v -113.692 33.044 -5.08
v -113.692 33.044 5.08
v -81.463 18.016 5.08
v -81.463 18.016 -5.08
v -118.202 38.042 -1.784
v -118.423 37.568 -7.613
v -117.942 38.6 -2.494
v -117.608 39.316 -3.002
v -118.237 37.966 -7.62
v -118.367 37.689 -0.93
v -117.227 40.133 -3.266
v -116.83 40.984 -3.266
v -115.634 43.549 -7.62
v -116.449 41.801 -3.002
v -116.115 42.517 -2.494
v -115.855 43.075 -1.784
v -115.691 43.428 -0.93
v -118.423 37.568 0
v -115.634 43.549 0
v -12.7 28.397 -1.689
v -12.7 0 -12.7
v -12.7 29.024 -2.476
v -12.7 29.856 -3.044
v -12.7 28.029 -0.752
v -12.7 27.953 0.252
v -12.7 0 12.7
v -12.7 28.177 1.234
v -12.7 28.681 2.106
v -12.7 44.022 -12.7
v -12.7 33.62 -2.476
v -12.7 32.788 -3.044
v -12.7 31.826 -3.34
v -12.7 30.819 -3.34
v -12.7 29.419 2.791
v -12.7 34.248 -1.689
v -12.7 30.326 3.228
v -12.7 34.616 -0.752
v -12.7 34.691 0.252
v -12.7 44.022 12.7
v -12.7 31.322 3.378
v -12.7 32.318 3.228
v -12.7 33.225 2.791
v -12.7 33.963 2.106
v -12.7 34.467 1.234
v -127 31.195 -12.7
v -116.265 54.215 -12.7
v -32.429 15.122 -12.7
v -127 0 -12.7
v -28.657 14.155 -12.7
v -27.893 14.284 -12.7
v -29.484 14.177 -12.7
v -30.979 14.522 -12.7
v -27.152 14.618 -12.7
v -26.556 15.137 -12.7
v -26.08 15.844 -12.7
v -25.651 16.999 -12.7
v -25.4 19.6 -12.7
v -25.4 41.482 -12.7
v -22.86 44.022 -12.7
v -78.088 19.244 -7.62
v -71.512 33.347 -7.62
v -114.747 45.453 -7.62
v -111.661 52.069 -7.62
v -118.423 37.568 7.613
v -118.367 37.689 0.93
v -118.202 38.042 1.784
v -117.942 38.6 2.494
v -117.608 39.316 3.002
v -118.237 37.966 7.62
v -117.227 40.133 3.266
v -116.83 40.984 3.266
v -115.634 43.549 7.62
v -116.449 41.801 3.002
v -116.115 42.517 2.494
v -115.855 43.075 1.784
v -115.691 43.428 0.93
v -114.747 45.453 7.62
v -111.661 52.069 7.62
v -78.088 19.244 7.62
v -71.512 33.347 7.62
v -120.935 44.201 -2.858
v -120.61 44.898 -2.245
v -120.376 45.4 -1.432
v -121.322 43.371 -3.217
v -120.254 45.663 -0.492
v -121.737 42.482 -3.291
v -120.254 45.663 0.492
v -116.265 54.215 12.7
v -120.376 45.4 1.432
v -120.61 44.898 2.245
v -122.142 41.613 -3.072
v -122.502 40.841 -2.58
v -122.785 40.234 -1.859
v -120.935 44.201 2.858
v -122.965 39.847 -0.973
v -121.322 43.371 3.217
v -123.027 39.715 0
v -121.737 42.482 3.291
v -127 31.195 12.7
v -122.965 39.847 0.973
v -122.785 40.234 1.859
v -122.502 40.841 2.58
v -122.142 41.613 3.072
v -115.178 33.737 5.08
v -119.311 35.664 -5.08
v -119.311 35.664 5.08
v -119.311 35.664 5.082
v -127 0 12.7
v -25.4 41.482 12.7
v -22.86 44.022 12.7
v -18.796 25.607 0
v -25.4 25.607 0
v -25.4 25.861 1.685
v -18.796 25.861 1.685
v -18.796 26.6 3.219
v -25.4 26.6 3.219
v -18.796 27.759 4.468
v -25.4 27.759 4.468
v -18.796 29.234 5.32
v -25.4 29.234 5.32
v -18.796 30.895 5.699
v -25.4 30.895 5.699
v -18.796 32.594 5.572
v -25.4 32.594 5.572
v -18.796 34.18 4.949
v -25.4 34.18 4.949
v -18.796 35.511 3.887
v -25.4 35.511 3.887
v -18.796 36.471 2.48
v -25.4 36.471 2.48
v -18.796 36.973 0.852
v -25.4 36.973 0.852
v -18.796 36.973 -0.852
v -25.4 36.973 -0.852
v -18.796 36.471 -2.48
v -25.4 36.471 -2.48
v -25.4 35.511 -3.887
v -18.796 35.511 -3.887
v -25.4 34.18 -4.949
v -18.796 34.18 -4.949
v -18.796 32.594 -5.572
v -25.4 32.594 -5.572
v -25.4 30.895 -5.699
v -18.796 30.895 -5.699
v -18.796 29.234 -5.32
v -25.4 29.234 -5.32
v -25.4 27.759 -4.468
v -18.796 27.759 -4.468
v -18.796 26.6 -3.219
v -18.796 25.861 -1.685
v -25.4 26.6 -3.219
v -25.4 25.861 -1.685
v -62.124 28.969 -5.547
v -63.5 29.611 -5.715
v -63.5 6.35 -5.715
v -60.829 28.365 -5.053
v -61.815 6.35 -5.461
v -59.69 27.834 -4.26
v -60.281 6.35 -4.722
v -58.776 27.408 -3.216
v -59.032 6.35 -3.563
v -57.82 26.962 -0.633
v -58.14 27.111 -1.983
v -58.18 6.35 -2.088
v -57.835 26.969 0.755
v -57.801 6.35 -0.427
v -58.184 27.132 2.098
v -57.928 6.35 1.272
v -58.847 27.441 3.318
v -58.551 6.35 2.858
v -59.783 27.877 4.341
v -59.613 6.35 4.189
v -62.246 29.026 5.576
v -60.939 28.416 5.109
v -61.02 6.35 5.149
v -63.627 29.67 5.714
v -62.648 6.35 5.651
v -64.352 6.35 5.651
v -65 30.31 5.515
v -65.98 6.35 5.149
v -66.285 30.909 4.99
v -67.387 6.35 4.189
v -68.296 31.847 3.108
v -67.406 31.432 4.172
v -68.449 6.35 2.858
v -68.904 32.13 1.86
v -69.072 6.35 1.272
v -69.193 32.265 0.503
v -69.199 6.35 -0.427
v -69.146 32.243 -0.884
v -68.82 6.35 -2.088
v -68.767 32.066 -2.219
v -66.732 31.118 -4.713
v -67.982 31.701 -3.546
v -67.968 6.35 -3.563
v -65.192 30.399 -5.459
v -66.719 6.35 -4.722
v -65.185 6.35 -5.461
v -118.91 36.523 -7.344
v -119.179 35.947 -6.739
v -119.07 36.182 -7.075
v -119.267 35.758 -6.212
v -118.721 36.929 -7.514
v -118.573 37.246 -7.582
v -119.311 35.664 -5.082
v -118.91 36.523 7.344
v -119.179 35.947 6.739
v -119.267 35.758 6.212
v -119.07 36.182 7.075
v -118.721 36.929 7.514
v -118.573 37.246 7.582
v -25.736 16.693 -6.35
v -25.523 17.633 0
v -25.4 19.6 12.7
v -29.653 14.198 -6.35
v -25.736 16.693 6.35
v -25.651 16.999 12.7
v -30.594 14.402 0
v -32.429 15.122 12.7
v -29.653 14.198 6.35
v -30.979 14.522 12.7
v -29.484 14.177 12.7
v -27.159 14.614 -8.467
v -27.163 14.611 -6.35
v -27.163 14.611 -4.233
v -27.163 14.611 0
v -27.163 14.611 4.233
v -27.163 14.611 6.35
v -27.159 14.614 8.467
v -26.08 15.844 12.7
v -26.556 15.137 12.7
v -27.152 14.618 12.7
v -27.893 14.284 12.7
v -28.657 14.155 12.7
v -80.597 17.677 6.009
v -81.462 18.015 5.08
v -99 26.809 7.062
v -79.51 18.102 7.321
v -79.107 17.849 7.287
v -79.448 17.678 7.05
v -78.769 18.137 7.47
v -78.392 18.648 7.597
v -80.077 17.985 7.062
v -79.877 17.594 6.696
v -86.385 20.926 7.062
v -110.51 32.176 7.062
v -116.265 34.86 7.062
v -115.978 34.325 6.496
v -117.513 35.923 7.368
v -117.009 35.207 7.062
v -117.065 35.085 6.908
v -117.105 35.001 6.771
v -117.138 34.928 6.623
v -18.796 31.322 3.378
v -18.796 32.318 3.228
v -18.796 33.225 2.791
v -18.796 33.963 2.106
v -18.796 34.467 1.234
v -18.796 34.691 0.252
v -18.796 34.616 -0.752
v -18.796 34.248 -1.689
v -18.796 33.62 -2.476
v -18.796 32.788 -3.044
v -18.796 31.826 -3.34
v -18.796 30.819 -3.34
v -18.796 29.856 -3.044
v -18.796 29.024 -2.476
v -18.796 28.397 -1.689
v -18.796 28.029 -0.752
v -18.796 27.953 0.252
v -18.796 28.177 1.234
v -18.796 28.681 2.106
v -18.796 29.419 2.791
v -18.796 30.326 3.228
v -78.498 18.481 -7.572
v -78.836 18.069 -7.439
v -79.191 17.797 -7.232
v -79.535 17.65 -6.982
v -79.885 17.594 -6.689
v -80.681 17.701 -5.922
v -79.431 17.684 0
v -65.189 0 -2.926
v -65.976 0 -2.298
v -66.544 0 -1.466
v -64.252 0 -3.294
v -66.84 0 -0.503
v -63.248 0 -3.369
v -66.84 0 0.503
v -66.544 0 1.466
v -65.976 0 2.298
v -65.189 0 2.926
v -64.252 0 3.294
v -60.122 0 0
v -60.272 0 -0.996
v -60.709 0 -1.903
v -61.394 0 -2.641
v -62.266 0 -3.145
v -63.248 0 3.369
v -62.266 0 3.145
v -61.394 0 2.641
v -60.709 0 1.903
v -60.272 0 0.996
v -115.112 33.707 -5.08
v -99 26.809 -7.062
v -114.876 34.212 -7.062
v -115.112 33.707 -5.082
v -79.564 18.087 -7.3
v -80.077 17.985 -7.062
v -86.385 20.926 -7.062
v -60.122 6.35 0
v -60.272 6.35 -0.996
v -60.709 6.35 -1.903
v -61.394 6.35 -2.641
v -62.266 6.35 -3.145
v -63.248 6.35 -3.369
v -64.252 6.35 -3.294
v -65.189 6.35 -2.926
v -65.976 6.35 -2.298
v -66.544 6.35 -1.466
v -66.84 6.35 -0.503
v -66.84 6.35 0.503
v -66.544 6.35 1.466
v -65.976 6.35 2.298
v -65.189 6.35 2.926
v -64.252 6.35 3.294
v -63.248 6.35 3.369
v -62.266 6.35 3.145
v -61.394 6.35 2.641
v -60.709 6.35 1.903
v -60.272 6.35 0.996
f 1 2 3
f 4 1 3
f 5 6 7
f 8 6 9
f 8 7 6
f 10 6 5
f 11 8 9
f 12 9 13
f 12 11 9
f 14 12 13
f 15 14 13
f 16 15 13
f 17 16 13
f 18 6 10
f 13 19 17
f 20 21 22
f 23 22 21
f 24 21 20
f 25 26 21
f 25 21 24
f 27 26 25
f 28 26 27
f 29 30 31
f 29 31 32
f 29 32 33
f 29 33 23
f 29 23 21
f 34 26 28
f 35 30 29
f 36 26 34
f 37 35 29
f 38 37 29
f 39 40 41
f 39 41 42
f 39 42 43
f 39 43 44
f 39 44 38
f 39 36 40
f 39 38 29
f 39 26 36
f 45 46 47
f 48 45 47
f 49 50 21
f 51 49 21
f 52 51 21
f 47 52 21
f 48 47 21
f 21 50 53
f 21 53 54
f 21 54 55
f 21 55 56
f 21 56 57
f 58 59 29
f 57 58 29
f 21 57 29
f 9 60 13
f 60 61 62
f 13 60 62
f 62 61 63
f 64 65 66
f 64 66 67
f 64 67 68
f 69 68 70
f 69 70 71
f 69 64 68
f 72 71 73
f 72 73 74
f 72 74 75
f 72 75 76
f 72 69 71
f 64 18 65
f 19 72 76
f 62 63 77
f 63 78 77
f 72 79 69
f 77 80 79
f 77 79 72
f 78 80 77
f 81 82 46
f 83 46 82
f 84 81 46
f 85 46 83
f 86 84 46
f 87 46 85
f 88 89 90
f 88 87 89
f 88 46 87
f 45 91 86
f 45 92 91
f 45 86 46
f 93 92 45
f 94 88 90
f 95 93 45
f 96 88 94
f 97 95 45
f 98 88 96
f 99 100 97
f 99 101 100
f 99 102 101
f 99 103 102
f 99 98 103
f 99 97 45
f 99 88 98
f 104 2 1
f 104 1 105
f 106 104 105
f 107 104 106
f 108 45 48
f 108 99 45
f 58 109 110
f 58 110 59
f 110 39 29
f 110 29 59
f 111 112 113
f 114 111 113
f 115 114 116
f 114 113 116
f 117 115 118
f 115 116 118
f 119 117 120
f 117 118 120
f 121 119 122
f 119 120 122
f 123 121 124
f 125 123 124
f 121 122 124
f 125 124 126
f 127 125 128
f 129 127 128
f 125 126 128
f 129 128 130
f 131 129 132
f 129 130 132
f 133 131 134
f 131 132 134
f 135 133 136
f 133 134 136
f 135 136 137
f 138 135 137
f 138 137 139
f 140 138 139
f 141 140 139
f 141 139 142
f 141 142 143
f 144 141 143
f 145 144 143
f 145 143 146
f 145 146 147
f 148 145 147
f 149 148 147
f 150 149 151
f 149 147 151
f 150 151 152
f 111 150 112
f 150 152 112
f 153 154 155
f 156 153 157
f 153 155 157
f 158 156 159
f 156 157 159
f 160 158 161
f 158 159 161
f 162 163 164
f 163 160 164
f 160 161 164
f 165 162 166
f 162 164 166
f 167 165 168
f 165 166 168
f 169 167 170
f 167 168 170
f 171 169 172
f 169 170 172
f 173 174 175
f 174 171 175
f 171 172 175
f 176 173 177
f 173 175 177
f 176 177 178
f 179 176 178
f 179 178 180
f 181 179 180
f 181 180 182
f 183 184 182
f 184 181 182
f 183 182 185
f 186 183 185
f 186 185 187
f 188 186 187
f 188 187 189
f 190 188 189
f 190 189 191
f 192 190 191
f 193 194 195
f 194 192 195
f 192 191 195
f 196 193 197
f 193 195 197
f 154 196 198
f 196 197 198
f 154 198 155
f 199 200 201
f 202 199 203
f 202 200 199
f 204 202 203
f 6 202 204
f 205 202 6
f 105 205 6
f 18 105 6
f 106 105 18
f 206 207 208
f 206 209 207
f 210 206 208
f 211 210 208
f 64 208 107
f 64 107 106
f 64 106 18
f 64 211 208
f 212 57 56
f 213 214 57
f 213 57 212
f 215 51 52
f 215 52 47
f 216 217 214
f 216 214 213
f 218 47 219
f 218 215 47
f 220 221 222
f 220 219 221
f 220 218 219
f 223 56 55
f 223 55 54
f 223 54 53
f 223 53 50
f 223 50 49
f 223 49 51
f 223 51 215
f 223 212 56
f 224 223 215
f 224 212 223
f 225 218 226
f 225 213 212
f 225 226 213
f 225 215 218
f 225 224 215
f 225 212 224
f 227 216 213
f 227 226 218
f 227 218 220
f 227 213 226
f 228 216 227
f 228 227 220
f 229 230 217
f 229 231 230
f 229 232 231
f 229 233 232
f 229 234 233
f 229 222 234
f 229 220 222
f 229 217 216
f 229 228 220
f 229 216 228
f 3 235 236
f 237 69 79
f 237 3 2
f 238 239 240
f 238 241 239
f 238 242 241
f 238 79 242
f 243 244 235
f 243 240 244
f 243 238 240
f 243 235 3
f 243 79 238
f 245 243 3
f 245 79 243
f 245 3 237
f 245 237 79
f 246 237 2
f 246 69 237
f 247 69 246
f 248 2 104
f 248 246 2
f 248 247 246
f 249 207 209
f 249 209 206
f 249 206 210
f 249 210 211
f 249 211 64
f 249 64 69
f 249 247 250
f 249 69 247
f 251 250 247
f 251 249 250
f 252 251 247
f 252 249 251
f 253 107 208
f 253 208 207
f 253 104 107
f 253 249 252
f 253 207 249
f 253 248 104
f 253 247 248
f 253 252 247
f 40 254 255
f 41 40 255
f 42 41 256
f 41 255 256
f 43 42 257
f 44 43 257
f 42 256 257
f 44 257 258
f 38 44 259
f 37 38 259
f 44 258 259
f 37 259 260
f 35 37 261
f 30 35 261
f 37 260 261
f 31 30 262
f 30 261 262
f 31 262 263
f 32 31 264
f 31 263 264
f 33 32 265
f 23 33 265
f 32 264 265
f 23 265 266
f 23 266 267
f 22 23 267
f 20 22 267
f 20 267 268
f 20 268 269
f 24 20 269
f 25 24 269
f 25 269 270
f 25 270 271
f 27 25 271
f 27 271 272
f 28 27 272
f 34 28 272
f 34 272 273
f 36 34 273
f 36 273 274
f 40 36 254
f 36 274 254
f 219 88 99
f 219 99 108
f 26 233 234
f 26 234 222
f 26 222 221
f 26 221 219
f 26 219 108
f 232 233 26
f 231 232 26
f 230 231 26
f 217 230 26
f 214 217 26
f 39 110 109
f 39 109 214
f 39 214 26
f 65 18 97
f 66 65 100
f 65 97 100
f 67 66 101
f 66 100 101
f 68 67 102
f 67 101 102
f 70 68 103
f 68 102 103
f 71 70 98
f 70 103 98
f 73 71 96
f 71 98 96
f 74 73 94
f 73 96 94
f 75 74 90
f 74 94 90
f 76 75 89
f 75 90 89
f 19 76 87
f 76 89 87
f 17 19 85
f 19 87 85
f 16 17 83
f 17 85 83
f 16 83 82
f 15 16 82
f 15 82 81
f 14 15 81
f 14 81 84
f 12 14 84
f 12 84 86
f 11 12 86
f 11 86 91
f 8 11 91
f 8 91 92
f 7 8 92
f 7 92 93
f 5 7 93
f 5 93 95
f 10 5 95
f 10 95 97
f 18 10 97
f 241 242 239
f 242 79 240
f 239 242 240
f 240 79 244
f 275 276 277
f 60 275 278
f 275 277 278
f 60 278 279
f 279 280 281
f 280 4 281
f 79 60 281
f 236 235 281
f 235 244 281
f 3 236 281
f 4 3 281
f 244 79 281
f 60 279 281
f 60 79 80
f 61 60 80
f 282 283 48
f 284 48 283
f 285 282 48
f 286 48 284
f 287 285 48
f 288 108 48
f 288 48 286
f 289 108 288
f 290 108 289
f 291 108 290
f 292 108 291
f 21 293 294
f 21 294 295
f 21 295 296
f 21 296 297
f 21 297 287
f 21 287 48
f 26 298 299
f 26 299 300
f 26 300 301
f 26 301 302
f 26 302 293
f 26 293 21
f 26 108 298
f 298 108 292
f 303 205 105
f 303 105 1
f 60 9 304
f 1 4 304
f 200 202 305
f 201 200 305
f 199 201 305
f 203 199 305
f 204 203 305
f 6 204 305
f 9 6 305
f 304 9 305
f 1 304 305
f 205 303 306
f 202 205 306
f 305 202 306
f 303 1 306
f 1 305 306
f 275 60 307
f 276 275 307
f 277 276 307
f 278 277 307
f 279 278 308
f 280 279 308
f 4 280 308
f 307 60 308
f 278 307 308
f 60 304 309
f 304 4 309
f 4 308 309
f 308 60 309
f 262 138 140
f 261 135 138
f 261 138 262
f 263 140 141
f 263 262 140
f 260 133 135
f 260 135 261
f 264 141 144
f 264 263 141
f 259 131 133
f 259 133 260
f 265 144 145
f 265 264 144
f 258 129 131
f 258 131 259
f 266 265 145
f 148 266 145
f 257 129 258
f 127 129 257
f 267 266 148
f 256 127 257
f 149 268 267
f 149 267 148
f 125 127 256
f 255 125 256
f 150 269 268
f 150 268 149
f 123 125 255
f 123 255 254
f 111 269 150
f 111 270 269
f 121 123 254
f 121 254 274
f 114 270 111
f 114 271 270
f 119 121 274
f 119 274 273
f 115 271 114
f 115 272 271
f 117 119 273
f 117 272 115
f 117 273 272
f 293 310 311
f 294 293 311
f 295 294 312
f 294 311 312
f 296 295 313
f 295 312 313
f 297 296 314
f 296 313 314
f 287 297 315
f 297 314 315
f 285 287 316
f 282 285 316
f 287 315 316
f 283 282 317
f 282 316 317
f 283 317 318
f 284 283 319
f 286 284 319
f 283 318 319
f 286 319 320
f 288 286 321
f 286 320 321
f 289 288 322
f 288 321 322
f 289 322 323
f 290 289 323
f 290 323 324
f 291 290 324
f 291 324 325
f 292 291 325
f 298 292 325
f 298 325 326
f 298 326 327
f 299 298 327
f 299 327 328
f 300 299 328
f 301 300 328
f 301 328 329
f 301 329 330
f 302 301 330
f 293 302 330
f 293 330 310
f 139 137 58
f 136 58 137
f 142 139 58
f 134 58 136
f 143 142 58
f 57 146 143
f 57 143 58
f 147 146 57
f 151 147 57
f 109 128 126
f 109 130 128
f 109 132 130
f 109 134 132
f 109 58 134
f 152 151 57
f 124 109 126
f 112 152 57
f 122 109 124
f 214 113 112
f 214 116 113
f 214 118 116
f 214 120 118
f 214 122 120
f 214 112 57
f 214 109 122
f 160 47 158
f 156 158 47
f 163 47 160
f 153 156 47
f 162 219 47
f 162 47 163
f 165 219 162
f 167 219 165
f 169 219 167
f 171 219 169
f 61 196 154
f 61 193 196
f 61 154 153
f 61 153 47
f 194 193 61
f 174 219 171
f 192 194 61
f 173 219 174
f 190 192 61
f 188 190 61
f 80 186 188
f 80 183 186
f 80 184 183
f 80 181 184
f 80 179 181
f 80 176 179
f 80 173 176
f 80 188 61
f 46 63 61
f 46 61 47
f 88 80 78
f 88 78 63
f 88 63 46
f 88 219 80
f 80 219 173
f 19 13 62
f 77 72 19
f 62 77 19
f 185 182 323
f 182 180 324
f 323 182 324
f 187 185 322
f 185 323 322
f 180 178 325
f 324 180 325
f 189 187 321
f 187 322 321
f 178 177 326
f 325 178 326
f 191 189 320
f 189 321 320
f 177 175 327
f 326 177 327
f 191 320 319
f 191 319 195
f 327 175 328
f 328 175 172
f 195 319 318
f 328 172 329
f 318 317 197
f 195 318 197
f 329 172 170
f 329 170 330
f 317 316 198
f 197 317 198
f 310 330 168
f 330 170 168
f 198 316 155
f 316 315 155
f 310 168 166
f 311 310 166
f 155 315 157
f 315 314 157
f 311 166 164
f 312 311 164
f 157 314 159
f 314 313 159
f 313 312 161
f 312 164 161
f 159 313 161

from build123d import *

# Parameters (mm, degrees)
BOSS_EXTRUDE2_DEPTH         = 12.7
CUT_EXTRUDE1_DEPTH          = 7.62
SKETCH3_R                   = 3.3
CUT_EXTRUDE3_DEPTH          = 5.08
FILLET1_START               = -124
FILLET1_DEPTH               = 45.095218809
FILLET1_START_2             = -7.62
FILLET1_2_DEPTH             = 16.62
FILLET1_3_DEPTH             = 46
F_1_4_CLEARANCE_HOLE1_D     = 6.7564
SKETCH8_R                   = 5.715
CUT_EXTRUDE4_DEPTH          = 137.313591586
CUT_EXTRUDE5_DEPTH          = 141.404698959
BOSS_EXTRUDE3_DEPTH         = 25.4
F_1_4_CLEARANCE_HOLE2_D     = 6.7564
F_1_4_CLEARANCE_HOLE2_DEPTH = 12.7
F_1_4_CLEARANCE_HOLE2_TIP   = 2.029827343
SKETCH14_R                  = 5.715
CUT_EXTRUDE6_DEPTH          = 6.604
CHAMFER1_SIZE               = 2.54


with BuildPart() as part:
    # Sketch1 → Boss-Extrude2 (new, symmetric)
    with BuildSketch(Plane.XY):
        Polygon((-127, 31.195273444), (-127, 0), (0, 0), (-116.265496152, 54.215491235), align=None)
    extrude(amount=BOSS_EXTRUDE2_DEPTH, both=True)

    # Sketch2 → Cut-Extrude1 (cut, symmetric)
    with BuildSketch(Plane.XY):
        Polygon((-115.634064254, 43.549297267), (-114.746565904, 45.45254362), (-109.127457625, 42.832310397), (-113.691734852, 33.044186297), (-119.310843131, 35.66441952), (-118.423344781, 37.567665873), align=None)
        Polygon((-71.512017628, 33.34660147), (-111.661452594, 52.068590465), (-114.746565904, 45.45254362), (-109.127457625, 42.832310397), (-113.691734852, 33.044186297), (-79.161408165, 16.942430525), align=None)
    extrude(amount=CUT_EXTRUDE1_DEPTH, both=True, mode=Mode.SUBTRACT)

    # Sketch3 → Cut-Extrude3 (cut)
    with BuildSketch(Plane(origin=(-116.265496152, 54.215491235, 0), x_dir=(0, 0, 1), z_dir=(-0.9063077870366528, 0.42261826174069317, 0))):
        with Locations(Location((0, -12.7, 0), (0, 0, 270))):
            Circle(SKETCH3_R)
    extrude(amount=-CUT_EXTRUDE3_DEPTH, mode=Mode.SUBTRACT)


with BuildPart() as fillet1_tool:
    # Fillet1: read off the stored shape, not the designer's step
    # Fillet1 outline → Fillet1 (new body)
    with BuildSketch(Plane(origin=(0, 0, 0), x_dir=(0.42261826174025074, 0.9063077870368592, -5.451523076012236e-13), z_dir=(0.9063077870368591, -0.42261826174025074, -1.1690828963840908e-12)).offset(FILLET1_START)):
        with BuildLine():
            Line((-18.1, 7.62), (-18.1, 5.08))
            add(Edge.make_bspline(
                [(-15.56, 7.62), (-15.987223051, 7.62), (-16.414446102, 7.62), (-17.356051224, 7.437902524), (-17.917902524, 6.876051224), (-18.1, 5.934446102), (-18.1, 5.507223051), (-18.1, 5.08)],
                knots=[0, 0, 0, 0, 0, 0, 0.5, 0.5, 1, 1, 1, 1, 1, 1], degree=5))
            Line((-15.56, 7.62), (-18.1, 7.62))
        make_face()
    extrude(amount=FILLET1_DEPTH)


with BuildPart() as part_1:
    add(part.part)


with BuildPart() as part_2:
    # Fillet1: joined with fillet1_tool
    add(part_1.part.fuse(fillet1_tool.part, tol=0.00001))


with BuildPart() as fillet1_2_tool:
    # Fillet1 2 outline → Fillet1 2 (new body)
    with BuildSketch(Plane.XY.offset(FILLET1_START_2)):
        with BuildLine():
            Line((-79.161408165, 16.942430525), (-78.087957781, 19.244452304))
            add(Edge.make_bspline(
                [(-78.087957781, 19.244452304), (-78.268510044, 18.857256726), (-78.449062307, 18.470061148), (-79.012038188, 17.693634812), (-79.758697015, 17.421873224), (-80.689038789, 17.654776383), (-81.076234367, 17.835328646), (-81.463429944, 18.015880909)],
                knots=[0, 0, 0, 0, 0, 0, 0.5, 0.5, 1, 1, 1, 1, 1, 1], degree=5))
            Line((-81.463429944, 18.015880909), (-79.161408165, 16.942430525))
        make_face()
    extrude(amount=FILLET1_2_DEPTH)


with BuildPart() as part_3:
    add(part_2.part)


with BuildPart() as part_4:
    # Fillet1 2: joined with fillet1_2_tool
    add(part_3.part.fuse(fillet1_2_tool.part, tol=0.00001))


with BuildPart() as fillet1_3_tool:
    # Fillet1 3 outline → Fillet1 3 (new body)
    with BuildSketch(Plane(origin=(0, 0, 0), x_dir=(0.42261826174025074, 0.9063077870368592, -5.451523076012236e-13), z_dir=(0.9063077870368591, -0.42261826174025074, -1.1690828963840908e-12)).offset(FILLET1_START)):
        with BuildLine():
            Line((-14, -7.62), (-15.56, -7.62))
            add(Edge.make_bspline(
                [(-15.56, -7.62), (-15.987223051, -7.62), (-16.414446102, -7.62), (-17.356051224, -7.437902524), (-17.917902524, -6.876051224), (-18.1, -5.934446102), (-18.1, -5.507223051), (-18.1, -5.08)],
                knots=[0, 0, 0, 0, 0, 0, 0.5, 0.5, 1, 1, 1, 1, 1, 1], degree=5))
            Line((-18.1, -5.08), (-18.1, -4))
            Line((-18.1, -4), (-20, -4))
            Line((-20, -4), (-20, -9))
            Line((-20, -9), (-14, -9))
            Line((-14, -9), (-14, -7.62))
        make_face()
    extrude(amount=FILLET1_3_DEPTH)


with BuildPart() as part_5:
    add(part_4.part)


with BuildPart() as part_6:
    # Fillet1 3: joined with fillet1_3_tool
    add(part_5.part.fuse(fillet1_3_tool.part, tol=0.00001))

    # 1/4 Clearance Hole1 (through all)
    with Locations(Plane(origin=(0, 0, 0), x_dir=(-1, 0, 0), z_dir=(0, -1, 0))):
        with Locations((63.5, 0)):
            Hole(F_1_4_CLEARANCE_HOLE1_D / 2)

    # Sketch8 → Cut-Extrude4 (cut, through all)
    with BuildSketch(Plane(origin=(0, 6.35, 0), x_dir=(-1, 0, 0), z_dir=(0, -1, 0))):
        with Locations(Location((63.5, 0, 0), (0, 0, 90))):
            Circle(SKETCH8_R)
    extrude(amount=-CUT_EXTRUDE4_DEPTH, mode=Mode.SUBTRACT)

    # Sketch9 → Cut-Extrude5 (cut, through all)
    with BuildSketch(Plane.XY.offset(12.7)):
        Polygon((-12.7, 5.922107259), (-12.7, 0), (0, 0), align=None)
    extrude(amount=-CUT_EXTRUDE5_DEPTH, mode=Mode.SUBTRACT)

    # Sketch10 → Boss-Extrude3 (add)
    with BuildSketch(Plane.XY.offset(12.7)):
        Polygon((-12.7, 5.922107259), (-12.7, 44.022107259), (-25.4, 44.022107259), (-25.4, 11.844214517), align=None)
    extrude(amount=-BOSS_EXTRUDE3_DEPTH)

    # 1/4 Clearance Hole2
    with Locations(Plane(origin=(-12.7, 0, 0), x_dir=(0, 0, -1), z_dir=(1, 0, 0))):
        with Locations((0, 31.322107259)):
            Hole(F_1_4_CLEARANCE_HOLE2_D / 2, depth=F_1_4_CLEARANCE_HOLE2_DEPTH)
            with Locations((0, 0, -(F_1_4_CLEARANCE_HOLE2_DEPTH + F_1_4_CLEARANCE_HOLE2_TIP / 2))):  # 118° drill point
                Cone(0, F_1_4_CLEARANCE_HOLE2_D / 2, F_1_4_CLEARANCE_HOLE2_TIP, mode=Mode.SUBTRACT)

    # Sketch14 → Cut-Extrude6 (cut)
    with BuildSketch(Plane.ZY.offset(25.4)):
        with Locations(Location((0, 31.322107259, 0), (0, 0, 270))):
            Circle(SKETCH14_R)
    extrude(amount=-CUT_EXTRUDE6_DEPTH, mode=Mode.SUBTRACT)

    # Chamfer1
    chamfer1_edges = [part_6.edges().sort_by_distance(p)[0] for p in [
        (-25.4, 44.022107259, 0),
    ]]
    chamfer(chamfer1_edges, length=CHAMFER1_SIZE)

    # Fillet2
    # a fillet whose section is not a circle: 5.08 mm, written as the material it adds along each edge (its section moved 0.00015 mm through the faces so that the kernel can cut it)
    with BuildSketch(Plane(origin=(-25.4, 11.844214517, 12.7), x_dir=(1.881112974510357e-05, 0.9999999998230706, 0), z_dir=(0, 0, -1))) as fillet2_piece_1:
        with BuildLine():
            add(Edge.make_bspline([(7.974002733, 0), (6.748845081, 2.3047e-05), (5.523687428, 4.6093e-05), (2.911264627, -0.681700719), (1.848095837, -2.35047216), (2.334181059, -5.00626823), (2.851934169, -6.11664789), (3.369687279, -7.227027551)], knots=[0, 0, 0, 0, 0, 0, 0.5, 0.5, 1, 1, 1, 1, 1, 1], degree=5))
            Line((3.369687279, -7.227027551), (3.277605601, -7.269963835))
            ThreePointArc((3.277605601, -7.269963835), (1.592829935, -3.656418364), (-0.092081679, -0.042936283))
            Line((-0.092081679, -0.042936283), (1.911e-06, 0.1016))
            ThreePointArc((1.911e-06, 0.1016), (3.987003276, 0.101525), (7.974004644, 0.1016))
            Line((7.974004644, 0.1016), (7.974002733, 0))
        make_face()
    extrude(amount=25.4)


solid = part_6.part
